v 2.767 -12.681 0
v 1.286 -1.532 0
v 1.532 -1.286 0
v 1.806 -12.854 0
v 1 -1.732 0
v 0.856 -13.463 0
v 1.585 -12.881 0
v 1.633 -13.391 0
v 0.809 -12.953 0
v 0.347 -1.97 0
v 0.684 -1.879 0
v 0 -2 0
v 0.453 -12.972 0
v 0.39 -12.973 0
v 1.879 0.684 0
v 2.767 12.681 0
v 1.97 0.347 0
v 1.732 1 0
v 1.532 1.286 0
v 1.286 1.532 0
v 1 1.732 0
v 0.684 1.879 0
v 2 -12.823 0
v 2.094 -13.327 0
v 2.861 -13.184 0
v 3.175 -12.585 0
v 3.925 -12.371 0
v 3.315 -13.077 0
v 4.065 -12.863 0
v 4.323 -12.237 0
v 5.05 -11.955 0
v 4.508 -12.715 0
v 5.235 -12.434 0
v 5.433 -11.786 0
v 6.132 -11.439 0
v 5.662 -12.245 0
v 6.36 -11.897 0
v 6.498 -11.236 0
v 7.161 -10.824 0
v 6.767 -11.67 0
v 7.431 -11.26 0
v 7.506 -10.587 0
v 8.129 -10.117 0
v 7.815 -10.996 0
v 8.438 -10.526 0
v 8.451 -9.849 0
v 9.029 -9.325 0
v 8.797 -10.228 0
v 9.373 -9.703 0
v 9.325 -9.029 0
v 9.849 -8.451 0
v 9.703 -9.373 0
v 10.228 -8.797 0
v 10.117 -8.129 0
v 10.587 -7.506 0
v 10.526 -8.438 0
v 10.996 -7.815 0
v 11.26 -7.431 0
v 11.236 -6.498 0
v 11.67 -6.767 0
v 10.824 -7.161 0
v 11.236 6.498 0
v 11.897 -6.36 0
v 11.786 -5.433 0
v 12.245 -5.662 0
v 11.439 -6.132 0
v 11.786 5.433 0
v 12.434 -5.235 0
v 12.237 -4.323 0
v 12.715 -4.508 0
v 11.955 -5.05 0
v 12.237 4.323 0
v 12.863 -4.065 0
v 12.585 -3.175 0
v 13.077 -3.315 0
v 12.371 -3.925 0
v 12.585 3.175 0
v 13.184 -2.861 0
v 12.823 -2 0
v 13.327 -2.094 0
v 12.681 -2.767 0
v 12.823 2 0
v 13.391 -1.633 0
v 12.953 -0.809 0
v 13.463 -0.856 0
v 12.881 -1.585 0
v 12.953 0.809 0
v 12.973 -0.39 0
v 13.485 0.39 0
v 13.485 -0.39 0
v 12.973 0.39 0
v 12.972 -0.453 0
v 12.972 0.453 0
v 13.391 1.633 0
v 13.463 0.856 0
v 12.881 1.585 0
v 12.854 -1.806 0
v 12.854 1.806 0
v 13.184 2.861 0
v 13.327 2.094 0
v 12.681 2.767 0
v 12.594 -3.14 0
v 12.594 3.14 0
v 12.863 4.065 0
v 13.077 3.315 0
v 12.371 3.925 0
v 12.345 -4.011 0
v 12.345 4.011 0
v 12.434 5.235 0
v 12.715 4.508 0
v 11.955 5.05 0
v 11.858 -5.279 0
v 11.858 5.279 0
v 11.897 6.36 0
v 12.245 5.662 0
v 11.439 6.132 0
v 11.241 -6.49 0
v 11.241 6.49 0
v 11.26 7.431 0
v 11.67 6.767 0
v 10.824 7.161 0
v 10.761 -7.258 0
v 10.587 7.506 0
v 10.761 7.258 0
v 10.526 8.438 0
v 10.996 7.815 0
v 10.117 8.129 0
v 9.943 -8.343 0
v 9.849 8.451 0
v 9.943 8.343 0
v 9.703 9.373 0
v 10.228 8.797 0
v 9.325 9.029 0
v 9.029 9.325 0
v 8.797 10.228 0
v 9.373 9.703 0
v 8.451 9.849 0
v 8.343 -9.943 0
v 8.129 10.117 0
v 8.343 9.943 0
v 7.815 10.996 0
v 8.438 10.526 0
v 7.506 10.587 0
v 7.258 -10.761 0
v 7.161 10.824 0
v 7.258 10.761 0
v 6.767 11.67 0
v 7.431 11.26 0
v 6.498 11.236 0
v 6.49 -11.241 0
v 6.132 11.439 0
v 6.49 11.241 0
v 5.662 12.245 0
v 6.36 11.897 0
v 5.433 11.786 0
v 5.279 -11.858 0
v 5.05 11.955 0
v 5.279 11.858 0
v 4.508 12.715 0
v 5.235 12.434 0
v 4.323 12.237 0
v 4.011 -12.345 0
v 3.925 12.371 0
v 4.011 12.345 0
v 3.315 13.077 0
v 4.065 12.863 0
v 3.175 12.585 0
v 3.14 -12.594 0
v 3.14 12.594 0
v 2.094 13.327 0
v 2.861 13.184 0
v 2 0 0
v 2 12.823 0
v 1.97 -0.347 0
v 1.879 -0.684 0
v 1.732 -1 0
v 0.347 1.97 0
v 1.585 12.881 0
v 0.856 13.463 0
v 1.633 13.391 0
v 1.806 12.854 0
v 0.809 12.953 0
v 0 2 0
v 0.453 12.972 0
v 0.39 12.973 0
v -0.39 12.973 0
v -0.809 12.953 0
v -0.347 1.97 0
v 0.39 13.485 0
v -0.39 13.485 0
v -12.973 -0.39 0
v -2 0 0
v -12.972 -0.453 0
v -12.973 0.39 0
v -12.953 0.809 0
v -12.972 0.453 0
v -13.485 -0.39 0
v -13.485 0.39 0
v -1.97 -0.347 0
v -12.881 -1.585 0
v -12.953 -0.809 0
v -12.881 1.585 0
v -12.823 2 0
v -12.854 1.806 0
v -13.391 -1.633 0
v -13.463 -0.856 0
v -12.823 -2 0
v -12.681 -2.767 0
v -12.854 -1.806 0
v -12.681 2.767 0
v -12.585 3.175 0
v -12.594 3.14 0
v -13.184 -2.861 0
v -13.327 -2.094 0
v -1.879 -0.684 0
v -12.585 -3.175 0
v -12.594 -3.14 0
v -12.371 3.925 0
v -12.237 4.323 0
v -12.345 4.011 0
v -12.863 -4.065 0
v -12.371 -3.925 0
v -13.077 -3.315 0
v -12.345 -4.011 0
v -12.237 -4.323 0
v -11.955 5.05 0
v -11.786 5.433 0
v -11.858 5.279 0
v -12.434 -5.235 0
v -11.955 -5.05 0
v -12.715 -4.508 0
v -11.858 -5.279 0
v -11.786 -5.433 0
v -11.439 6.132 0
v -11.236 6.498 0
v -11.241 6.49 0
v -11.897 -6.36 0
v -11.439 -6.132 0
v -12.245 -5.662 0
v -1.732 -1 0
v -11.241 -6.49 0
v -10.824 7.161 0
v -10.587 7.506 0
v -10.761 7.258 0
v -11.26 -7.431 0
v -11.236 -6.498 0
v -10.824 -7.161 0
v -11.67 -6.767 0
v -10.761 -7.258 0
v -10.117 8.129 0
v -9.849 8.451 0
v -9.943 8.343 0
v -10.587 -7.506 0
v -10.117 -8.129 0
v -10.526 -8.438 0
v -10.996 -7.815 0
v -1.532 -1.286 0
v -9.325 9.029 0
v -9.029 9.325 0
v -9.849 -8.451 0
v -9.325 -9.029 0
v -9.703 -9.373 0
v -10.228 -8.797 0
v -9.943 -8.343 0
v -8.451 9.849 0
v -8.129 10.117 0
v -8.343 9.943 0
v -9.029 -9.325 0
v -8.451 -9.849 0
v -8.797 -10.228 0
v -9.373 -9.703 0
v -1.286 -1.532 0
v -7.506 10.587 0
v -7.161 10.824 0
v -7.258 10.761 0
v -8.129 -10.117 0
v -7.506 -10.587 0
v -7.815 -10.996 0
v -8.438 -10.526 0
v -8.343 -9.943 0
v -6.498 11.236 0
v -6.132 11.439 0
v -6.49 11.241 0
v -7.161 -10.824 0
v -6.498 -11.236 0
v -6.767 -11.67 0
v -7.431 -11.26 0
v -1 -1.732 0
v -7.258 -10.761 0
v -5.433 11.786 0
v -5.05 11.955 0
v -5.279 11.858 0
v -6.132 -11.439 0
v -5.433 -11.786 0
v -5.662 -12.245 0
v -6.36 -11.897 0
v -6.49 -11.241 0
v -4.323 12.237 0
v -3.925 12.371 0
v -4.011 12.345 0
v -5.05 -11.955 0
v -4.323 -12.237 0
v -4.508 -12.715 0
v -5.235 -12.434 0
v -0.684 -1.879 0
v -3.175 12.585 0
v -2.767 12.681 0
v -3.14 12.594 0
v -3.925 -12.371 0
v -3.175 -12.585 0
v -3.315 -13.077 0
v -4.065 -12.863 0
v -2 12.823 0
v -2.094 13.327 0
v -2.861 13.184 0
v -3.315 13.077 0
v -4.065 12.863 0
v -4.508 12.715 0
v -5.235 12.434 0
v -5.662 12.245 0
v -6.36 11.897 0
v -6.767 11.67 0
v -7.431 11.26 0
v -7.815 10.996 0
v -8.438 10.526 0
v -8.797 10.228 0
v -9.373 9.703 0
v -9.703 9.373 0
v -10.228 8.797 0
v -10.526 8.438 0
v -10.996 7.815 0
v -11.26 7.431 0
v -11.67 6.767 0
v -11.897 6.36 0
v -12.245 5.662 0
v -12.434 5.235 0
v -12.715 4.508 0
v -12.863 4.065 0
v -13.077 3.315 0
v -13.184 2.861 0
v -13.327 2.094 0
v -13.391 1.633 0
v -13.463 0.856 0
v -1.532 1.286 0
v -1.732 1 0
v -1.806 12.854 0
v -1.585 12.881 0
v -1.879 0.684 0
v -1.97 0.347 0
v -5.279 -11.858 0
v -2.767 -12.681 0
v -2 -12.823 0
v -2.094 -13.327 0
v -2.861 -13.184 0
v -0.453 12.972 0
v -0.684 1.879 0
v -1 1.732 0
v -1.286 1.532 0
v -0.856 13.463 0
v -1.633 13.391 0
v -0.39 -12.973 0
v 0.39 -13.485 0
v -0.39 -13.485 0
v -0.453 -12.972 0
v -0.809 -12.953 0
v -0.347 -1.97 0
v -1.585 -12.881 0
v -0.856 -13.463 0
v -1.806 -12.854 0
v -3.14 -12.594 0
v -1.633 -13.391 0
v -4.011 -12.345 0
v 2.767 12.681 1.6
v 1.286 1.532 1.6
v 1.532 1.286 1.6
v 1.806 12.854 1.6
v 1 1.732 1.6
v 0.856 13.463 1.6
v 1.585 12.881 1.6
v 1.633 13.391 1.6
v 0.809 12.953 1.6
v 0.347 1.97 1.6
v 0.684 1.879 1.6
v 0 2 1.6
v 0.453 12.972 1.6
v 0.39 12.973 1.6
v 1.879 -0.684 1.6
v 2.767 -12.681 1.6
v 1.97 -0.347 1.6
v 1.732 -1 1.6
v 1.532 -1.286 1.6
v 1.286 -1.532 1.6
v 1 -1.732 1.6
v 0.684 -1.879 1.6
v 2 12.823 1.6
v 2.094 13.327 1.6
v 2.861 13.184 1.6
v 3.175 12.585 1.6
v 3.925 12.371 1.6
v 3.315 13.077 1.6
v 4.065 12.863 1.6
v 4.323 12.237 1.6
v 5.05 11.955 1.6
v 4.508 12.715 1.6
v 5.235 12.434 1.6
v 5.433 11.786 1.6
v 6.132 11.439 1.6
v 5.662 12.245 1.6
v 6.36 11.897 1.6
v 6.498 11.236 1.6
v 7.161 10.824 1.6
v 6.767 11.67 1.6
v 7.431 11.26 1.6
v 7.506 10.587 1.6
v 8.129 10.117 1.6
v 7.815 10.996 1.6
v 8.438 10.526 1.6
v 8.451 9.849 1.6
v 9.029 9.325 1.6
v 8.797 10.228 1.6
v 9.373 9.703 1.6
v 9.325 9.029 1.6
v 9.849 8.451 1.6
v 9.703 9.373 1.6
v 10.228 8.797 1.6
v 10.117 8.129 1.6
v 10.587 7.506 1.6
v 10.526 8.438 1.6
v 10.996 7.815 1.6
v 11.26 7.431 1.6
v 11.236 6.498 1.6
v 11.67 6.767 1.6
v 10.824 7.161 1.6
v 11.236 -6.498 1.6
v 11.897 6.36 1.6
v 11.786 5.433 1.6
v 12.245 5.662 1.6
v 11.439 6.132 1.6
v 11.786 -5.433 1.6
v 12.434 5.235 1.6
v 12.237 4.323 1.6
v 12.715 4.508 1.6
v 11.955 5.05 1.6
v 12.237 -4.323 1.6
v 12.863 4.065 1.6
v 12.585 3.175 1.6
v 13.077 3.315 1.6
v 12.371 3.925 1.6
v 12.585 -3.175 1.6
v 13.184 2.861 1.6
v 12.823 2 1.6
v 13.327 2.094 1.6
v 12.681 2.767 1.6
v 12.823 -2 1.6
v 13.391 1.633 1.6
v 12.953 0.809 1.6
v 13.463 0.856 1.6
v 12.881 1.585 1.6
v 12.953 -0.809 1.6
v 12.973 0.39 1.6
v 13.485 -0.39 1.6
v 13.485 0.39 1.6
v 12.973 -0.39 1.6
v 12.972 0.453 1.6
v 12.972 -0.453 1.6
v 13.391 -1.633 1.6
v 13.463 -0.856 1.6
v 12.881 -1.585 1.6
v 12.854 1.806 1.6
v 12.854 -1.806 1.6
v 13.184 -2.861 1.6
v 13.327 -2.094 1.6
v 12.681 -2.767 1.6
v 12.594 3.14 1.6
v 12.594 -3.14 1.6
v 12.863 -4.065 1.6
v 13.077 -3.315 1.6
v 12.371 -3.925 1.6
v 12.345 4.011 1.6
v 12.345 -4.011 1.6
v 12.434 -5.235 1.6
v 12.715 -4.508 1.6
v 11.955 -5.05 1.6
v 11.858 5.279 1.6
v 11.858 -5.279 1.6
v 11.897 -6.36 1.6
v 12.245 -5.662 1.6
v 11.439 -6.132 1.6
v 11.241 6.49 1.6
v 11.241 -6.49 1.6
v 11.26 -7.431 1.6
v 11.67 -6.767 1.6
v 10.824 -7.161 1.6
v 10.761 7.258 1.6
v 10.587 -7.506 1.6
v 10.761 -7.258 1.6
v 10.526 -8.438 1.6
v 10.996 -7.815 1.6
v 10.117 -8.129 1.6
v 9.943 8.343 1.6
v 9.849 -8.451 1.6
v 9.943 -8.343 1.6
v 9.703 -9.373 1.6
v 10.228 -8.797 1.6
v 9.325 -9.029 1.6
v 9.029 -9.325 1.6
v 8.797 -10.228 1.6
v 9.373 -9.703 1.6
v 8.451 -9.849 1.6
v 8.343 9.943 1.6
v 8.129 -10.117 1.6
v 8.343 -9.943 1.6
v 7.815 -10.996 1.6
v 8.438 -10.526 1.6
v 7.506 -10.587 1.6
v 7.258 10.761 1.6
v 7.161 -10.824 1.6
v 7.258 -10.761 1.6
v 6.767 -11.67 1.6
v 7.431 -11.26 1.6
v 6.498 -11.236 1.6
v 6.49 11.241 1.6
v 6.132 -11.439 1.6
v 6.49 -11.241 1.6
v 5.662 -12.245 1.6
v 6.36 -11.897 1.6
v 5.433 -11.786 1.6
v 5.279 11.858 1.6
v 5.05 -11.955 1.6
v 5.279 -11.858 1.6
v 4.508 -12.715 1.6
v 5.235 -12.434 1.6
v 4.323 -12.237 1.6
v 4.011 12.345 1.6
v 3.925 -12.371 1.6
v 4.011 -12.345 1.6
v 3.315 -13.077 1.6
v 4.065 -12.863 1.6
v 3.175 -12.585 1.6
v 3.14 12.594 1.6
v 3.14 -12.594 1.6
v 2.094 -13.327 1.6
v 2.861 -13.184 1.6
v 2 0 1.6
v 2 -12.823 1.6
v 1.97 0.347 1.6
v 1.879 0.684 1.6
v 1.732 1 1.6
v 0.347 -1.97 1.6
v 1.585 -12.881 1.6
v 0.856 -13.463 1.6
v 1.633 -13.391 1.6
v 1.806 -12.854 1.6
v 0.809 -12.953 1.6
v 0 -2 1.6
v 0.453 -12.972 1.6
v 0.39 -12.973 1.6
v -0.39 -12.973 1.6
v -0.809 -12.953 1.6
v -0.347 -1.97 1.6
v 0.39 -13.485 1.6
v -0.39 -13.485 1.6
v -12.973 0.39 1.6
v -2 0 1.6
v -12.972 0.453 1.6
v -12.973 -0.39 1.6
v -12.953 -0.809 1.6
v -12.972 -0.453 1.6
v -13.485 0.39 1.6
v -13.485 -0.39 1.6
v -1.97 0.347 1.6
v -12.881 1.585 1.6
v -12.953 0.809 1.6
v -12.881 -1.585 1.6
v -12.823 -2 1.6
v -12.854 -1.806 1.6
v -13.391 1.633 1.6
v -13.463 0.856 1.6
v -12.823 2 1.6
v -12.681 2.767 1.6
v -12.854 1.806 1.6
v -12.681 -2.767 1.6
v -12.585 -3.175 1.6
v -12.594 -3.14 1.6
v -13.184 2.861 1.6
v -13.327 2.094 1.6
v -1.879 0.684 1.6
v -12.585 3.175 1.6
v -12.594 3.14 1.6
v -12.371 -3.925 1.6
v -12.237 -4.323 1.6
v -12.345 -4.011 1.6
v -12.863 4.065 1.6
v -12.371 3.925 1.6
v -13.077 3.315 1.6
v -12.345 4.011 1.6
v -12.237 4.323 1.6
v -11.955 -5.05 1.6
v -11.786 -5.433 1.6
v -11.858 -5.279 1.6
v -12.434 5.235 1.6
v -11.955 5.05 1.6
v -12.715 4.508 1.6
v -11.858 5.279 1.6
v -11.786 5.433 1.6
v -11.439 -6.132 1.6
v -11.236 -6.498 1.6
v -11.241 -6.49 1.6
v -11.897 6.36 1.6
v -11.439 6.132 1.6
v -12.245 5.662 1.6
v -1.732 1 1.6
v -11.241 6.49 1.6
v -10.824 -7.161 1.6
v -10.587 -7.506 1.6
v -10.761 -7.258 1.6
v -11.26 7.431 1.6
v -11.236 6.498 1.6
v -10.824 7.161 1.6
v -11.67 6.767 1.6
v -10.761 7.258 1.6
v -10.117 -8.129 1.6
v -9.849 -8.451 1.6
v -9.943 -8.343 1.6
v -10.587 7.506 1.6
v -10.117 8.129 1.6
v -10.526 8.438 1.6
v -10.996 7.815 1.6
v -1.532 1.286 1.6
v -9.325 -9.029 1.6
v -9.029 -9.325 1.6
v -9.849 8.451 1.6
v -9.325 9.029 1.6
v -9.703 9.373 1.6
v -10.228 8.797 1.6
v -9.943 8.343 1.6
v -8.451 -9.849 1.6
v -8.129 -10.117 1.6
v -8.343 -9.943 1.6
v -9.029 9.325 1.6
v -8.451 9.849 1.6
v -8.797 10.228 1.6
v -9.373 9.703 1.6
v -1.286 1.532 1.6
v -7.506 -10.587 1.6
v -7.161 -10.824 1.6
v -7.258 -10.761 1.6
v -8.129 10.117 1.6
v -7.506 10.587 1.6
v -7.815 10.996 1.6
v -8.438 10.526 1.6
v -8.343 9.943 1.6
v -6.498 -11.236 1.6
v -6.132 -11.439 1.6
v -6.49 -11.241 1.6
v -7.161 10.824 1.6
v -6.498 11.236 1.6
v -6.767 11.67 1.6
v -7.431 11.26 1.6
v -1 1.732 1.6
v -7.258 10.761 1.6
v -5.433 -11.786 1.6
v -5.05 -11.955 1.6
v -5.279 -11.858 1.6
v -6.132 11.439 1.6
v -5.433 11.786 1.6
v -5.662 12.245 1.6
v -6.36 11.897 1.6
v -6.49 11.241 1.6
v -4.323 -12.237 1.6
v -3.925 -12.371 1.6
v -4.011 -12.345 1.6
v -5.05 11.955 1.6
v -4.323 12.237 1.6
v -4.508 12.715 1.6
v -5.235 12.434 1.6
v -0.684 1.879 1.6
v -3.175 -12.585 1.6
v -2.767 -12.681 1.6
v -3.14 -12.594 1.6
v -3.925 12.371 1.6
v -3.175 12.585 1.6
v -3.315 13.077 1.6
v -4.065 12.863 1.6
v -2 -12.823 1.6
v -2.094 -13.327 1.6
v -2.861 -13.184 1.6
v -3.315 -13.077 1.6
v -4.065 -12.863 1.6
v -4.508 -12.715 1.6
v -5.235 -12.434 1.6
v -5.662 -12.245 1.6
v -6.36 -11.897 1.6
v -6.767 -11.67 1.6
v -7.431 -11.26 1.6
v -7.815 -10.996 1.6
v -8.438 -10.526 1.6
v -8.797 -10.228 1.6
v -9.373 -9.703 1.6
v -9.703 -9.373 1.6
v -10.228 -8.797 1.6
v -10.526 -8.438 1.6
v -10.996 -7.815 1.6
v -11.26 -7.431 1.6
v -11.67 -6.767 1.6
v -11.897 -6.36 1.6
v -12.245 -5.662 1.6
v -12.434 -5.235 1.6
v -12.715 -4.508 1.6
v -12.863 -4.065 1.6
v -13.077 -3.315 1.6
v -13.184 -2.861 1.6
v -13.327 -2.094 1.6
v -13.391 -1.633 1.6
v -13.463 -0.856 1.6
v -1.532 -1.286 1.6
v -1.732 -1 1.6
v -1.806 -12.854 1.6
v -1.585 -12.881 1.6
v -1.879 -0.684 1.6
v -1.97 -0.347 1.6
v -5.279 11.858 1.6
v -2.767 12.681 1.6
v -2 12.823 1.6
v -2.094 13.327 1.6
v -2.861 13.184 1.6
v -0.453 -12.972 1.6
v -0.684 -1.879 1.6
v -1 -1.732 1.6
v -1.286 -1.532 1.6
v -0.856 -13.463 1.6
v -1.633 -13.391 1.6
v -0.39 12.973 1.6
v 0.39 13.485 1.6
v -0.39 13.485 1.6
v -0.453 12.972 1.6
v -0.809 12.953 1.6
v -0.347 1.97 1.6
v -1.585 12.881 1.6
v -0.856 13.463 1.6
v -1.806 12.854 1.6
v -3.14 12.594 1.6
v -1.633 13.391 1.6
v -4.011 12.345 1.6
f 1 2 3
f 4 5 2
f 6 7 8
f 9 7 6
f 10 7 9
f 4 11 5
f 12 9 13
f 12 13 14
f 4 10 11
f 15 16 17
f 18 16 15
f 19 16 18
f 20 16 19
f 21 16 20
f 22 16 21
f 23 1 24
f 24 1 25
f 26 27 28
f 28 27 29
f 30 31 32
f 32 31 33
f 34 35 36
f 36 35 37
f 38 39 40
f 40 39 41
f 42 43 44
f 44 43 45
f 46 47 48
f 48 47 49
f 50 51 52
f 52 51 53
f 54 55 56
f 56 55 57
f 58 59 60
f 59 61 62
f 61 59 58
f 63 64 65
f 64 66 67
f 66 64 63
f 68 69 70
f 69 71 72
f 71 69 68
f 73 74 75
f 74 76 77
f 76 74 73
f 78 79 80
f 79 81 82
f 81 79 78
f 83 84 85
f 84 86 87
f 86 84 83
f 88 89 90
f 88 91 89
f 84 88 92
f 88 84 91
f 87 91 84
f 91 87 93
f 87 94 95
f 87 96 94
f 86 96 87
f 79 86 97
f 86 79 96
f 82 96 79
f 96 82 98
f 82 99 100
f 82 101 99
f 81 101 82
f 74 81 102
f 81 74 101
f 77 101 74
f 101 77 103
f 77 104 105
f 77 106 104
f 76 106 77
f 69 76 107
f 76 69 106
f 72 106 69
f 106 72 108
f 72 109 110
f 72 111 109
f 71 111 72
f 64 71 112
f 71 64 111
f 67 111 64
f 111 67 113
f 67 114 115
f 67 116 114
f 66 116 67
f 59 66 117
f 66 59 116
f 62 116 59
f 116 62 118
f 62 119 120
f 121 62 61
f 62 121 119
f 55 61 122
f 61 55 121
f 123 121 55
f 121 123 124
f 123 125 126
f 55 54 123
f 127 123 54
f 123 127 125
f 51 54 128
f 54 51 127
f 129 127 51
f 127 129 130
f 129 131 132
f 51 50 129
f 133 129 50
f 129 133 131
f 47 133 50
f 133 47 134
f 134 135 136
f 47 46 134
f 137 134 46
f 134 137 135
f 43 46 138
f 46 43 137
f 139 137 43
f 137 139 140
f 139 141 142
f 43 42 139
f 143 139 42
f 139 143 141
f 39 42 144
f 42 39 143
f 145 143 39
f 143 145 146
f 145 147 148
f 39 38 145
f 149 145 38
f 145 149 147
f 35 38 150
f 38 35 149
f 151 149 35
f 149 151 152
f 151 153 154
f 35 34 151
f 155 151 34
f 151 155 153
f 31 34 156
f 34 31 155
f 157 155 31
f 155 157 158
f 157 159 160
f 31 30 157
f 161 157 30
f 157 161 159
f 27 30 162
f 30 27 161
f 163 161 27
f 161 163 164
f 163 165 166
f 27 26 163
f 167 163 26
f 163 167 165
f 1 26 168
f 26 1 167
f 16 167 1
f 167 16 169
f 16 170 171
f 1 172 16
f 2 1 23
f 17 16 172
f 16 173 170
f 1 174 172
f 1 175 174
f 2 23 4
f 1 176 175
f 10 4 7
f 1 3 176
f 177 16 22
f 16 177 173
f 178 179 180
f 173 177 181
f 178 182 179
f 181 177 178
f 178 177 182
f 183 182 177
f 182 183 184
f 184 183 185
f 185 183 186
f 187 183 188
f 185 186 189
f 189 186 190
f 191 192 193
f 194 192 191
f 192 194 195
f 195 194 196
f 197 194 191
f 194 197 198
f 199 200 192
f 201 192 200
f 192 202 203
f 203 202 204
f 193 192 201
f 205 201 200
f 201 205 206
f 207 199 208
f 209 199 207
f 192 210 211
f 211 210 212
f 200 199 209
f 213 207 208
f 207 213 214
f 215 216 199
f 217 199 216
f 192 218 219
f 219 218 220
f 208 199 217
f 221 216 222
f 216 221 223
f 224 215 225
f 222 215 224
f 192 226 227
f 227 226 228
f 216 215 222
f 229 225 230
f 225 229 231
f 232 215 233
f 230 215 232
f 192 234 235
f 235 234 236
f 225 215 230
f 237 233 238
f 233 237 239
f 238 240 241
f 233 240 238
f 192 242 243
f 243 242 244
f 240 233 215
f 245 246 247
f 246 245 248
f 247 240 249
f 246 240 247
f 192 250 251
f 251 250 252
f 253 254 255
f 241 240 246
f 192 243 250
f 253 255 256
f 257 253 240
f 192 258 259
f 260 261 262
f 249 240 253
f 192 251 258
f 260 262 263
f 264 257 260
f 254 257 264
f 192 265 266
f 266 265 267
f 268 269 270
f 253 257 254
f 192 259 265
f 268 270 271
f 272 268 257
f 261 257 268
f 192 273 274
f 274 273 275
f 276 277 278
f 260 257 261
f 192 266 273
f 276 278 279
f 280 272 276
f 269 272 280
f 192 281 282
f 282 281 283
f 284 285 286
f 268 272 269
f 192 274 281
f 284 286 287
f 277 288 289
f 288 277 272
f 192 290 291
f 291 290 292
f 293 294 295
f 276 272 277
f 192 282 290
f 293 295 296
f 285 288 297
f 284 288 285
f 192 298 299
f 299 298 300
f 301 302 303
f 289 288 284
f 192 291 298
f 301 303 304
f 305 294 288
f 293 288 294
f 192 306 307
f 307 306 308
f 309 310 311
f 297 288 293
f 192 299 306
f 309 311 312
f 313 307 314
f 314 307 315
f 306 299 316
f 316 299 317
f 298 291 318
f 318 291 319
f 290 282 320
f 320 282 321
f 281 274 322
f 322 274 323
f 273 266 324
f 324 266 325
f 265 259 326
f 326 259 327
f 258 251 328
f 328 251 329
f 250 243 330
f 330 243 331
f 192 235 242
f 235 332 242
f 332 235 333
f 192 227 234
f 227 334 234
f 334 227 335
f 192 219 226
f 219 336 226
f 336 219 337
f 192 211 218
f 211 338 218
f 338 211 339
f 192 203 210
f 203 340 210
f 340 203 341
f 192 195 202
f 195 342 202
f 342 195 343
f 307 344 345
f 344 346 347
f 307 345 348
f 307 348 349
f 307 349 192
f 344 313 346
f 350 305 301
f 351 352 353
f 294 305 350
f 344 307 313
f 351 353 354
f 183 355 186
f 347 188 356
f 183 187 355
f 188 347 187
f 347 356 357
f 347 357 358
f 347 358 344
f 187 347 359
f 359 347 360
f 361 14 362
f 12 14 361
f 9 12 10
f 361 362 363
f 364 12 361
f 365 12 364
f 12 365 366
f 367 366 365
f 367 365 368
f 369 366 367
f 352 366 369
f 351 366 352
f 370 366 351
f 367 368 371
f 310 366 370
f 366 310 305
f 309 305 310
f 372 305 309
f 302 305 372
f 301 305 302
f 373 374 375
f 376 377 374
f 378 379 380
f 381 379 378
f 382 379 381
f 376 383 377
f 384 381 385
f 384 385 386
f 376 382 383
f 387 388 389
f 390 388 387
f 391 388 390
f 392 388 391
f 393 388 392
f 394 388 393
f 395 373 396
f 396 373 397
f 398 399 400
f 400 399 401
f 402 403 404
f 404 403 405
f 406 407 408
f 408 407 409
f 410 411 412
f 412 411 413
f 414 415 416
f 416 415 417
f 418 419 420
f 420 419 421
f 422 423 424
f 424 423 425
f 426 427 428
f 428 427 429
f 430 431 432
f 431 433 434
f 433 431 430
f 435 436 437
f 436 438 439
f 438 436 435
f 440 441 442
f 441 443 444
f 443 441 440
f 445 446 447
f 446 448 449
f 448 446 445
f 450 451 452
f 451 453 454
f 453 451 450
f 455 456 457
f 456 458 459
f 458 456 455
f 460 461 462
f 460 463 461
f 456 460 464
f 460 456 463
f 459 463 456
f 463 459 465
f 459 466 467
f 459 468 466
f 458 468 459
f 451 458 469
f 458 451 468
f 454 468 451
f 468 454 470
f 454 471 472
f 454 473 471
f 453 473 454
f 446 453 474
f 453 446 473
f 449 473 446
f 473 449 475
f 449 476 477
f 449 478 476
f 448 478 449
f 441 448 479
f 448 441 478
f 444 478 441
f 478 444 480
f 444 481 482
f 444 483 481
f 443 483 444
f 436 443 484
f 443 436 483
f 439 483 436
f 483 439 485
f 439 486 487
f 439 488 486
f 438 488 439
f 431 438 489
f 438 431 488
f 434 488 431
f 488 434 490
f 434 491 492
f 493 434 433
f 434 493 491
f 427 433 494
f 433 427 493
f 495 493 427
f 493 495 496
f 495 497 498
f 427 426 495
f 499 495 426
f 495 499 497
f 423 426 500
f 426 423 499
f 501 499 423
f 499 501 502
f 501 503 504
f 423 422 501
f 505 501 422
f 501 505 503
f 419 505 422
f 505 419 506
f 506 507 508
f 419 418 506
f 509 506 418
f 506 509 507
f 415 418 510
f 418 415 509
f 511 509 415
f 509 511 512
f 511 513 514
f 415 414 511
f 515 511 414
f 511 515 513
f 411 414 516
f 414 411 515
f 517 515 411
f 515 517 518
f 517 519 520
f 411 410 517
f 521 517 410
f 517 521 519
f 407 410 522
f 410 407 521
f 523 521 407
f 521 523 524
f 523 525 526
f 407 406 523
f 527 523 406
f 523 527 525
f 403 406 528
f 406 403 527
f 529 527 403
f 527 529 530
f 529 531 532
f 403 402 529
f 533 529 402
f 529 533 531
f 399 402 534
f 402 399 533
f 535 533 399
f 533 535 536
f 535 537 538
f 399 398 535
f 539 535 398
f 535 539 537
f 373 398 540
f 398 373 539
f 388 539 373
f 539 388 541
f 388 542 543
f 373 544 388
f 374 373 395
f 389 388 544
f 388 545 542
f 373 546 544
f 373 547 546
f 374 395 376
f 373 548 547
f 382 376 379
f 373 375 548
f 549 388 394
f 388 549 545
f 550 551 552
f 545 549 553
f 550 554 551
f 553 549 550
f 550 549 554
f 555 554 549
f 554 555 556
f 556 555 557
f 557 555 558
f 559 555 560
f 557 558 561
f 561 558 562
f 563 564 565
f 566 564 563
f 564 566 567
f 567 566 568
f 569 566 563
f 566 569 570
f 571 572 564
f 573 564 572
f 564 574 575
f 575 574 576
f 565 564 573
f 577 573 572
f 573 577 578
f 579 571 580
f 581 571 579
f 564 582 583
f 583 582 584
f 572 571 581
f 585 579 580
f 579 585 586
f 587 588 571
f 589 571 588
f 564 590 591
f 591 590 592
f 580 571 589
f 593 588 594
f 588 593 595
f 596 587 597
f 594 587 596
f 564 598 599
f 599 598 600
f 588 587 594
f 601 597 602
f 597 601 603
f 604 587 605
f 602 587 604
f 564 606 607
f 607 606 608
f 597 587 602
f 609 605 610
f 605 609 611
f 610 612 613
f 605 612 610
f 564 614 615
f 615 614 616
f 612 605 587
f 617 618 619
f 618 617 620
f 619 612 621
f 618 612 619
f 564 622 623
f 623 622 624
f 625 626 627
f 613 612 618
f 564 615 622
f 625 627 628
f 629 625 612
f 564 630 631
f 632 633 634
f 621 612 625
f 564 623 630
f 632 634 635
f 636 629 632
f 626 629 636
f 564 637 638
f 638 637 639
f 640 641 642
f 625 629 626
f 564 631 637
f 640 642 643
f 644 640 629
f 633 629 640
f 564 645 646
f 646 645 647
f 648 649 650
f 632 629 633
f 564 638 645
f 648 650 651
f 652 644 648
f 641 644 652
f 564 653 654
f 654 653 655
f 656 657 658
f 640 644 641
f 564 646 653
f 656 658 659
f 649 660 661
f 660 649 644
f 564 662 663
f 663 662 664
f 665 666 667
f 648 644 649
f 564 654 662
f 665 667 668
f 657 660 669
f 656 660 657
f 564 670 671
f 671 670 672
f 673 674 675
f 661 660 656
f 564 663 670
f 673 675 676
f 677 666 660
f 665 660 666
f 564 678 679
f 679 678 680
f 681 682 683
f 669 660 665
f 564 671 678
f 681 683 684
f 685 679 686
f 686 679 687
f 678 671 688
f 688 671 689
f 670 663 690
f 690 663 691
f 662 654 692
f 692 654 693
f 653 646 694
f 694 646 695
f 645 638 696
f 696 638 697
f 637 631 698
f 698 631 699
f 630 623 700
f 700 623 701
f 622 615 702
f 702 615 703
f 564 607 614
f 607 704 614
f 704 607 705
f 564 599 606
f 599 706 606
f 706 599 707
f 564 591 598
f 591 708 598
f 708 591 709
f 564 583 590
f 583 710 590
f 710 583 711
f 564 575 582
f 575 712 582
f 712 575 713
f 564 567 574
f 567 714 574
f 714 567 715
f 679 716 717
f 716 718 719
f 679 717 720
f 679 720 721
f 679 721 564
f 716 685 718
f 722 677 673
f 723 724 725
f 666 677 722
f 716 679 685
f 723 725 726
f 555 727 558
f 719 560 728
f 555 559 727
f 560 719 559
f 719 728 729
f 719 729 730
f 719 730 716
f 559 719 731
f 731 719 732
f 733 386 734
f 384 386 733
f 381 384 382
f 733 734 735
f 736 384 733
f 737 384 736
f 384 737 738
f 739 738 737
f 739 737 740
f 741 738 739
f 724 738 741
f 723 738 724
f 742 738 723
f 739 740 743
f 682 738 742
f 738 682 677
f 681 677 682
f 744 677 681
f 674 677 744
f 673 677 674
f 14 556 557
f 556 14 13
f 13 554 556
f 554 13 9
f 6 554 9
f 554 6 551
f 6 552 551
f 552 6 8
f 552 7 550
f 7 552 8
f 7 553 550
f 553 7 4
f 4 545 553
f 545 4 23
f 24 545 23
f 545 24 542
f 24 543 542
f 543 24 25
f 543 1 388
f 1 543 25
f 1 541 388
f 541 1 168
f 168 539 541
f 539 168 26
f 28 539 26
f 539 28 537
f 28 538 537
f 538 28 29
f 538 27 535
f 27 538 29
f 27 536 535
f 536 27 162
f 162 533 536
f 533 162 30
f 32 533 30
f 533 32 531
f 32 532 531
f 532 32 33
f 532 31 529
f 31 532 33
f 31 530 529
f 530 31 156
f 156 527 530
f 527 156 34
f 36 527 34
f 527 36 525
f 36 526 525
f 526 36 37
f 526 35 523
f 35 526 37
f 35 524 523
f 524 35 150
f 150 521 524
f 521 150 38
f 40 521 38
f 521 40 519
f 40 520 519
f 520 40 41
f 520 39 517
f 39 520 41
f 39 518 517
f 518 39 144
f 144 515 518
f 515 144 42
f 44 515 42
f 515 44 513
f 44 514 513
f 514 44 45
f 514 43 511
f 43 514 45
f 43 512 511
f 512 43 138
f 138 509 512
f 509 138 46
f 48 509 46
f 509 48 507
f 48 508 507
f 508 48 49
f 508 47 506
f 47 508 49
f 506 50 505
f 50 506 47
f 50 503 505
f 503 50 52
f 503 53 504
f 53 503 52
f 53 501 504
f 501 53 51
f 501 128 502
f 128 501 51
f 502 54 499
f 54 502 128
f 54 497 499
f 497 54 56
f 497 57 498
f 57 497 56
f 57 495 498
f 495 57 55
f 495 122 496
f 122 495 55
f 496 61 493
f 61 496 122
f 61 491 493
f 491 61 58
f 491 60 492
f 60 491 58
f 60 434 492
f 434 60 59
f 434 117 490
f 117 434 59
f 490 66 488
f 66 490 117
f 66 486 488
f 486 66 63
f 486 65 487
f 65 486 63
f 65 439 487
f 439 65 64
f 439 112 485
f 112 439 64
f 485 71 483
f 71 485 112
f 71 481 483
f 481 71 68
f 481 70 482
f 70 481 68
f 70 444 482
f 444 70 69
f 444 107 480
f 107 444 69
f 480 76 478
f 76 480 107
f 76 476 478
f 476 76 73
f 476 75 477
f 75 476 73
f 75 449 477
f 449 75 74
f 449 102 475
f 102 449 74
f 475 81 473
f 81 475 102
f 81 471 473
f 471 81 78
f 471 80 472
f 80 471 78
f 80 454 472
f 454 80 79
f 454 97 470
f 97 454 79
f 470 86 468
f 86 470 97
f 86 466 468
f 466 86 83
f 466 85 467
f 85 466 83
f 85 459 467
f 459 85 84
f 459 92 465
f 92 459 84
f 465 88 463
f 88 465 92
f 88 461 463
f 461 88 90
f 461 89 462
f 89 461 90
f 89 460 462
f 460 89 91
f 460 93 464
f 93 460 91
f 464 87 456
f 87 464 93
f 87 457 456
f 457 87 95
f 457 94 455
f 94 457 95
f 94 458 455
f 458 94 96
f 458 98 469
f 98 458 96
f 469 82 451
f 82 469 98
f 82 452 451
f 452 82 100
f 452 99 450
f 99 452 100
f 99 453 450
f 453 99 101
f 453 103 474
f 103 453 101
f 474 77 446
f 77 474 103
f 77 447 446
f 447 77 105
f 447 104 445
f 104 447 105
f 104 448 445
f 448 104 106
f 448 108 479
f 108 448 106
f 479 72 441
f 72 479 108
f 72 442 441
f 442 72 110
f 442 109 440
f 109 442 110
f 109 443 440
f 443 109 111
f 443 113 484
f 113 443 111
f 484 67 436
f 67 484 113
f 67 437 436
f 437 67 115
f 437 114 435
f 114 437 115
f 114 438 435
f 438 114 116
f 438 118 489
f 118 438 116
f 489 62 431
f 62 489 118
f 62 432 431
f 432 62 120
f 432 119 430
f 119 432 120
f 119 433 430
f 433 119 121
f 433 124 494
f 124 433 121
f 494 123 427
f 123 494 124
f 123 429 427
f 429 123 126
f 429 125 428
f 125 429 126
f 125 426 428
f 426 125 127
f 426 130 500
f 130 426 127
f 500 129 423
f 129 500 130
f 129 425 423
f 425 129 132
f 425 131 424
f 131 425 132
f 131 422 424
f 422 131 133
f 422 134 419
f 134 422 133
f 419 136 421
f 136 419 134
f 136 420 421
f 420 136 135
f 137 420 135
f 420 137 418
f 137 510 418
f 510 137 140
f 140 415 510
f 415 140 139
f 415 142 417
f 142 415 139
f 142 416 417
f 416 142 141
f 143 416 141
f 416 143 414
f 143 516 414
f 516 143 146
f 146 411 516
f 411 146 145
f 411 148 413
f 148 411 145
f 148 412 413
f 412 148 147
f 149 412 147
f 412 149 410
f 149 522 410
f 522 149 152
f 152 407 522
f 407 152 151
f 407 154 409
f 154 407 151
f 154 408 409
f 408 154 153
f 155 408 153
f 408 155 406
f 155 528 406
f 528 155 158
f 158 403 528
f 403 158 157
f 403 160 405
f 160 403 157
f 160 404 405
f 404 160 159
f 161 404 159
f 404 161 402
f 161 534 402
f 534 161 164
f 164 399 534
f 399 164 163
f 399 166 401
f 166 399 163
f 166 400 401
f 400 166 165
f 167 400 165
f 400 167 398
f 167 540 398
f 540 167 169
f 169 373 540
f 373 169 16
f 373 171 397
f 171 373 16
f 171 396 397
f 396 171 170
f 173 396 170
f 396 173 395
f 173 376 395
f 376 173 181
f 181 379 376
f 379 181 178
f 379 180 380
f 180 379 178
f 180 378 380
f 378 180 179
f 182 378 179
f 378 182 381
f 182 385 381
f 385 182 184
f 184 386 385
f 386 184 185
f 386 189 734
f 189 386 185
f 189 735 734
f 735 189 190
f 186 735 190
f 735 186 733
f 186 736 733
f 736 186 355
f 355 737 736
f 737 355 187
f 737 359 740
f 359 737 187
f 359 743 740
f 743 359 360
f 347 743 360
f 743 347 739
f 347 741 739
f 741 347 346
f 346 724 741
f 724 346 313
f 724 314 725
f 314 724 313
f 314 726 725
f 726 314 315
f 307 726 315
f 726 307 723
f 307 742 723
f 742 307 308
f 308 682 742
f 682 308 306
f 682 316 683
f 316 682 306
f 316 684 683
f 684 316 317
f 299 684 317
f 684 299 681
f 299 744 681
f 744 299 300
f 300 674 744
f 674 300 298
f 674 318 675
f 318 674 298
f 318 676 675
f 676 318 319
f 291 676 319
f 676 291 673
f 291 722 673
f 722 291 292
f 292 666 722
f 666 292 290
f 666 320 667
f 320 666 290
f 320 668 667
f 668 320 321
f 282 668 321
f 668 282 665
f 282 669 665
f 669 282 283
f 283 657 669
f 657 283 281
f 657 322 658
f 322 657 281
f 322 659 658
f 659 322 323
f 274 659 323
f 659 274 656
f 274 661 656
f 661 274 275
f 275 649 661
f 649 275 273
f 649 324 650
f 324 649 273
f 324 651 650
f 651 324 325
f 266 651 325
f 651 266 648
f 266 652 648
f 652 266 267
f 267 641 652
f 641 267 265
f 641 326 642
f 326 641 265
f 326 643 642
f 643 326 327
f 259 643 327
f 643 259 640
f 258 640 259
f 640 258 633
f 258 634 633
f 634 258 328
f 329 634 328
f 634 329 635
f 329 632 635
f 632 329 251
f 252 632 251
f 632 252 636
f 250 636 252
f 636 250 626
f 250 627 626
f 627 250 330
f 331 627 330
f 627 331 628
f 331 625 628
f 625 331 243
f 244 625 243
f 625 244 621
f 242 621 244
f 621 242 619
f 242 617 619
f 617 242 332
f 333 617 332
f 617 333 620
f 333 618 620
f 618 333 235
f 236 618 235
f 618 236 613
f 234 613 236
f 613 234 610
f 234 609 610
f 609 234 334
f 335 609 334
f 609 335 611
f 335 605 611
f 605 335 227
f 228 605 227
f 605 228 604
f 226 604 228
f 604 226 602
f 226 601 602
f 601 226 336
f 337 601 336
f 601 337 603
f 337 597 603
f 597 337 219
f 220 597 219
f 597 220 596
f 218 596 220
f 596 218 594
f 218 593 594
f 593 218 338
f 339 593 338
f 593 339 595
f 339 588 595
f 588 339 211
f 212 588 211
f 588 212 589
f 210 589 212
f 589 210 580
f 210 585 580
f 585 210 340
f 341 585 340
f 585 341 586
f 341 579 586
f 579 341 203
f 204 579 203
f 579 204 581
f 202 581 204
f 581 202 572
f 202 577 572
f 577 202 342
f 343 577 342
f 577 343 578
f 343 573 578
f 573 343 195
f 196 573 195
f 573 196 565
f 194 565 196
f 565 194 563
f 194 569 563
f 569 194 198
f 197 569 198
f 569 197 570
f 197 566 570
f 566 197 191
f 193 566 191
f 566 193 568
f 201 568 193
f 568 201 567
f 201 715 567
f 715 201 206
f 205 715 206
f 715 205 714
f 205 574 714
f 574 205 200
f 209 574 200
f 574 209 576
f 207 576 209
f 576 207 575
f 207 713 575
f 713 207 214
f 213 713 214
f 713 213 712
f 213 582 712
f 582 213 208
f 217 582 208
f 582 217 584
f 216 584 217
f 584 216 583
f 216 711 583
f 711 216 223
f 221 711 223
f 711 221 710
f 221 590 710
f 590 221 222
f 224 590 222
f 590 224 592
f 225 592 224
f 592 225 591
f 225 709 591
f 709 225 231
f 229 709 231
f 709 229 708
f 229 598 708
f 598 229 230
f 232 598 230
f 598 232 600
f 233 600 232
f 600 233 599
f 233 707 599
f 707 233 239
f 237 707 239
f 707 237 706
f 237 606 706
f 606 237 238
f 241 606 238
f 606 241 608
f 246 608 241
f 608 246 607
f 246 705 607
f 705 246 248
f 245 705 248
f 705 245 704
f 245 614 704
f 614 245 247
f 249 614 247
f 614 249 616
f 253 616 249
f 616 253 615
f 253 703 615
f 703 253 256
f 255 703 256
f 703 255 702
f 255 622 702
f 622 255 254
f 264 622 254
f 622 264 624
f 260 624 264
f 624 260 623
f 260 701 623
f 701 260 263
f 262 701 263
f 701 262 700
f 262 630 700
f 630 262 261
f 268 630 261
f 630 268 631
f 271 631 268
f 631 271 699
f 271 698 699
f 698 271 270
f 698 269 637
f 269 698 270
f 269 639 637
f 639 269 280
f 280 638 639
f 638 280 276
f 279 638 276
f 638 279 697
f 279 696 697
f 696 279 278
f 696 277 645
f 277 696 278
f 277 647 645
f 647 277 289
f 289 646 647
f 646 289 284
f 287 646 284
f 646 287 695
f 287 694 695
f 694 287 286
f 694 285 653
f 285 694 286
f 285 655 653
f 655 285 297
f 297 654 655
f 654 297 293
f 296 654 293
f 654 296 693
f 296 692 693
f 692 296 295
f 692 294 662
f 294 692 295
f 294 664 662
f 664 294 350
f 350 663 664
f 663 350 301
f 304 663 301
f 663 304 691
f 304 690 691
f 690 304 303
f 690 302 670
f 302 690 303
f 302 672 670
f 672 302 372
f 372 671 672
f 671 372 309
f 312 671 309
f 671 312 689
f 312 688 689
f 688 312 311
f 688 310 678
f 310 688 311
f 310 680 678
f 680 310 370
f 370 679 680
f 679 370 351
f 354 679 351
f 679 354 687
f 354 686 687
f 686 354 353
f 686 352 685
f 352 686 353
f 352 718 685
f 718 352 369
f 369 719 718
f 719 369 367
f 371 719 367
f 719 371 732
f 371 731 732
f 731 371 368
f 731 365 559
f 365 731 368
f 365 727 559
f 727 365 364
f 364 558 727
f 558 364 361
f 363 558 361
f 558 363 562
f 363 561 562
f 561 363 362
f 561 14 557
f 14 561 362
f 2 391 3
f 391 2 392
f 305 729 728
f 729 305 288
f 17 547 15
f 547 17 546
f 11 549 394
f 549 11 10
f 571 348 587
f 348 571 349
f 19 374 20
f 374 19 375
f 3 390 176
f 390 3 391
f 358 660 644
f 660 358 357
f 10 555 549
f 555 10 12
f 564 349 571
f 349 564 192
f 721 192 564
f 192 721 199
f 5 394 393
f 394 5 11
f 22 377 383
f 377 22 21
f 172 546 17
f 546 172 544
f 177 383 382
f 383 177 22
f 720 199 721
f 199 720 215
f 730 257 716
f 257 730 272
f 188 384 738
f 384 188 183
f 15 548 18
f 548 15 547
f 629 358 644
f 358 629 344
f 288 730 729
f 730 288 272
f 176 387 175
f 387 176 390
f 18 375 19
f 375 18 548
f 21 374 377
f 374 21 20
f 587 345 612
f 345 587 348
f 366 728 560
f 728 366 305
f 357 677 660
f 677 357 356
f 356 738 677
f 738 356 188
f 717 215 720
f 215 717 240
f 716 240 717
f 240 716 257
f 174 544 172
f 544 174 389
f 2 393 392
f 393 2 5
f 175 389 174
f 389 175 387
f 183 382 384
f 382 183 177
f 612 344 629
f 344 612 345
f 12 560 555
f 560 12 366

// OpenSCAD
// part_id: h1
// name: Exeligmos main gear
// source_drawing_ids: DRW-009
// units: mm
// revision: 0.1
// SPDX-License-Identifier: MIT

module part_h1(
    outer_r = 13.99,
    root_r = 12.98,
    thickness = 1.6,
    bore_d = 4.0,
    teeth = 68
) {
    difference() {
        linear_extrude(height = thickness)
        union() {
            circle(r = root_r, $fn = 180);
            for (i = [0 : teeth - 1]) {
                a = i * 360 / teeth;
                rotate([0, 0, a]) translate([root_r, 0, 0]) square([outer_r - root_r, 0.78], center = true);
            }
        }
        translate([0, 0, -0.05]) cylinder(d = bore_d, h = thickness + 0.1, $fn = 36);
    }
}

// ---- "main guard" ----
// Default to previewing when opened directly:
if (is_undef(__LIB_MODE__)) {
    part_h1();
}
